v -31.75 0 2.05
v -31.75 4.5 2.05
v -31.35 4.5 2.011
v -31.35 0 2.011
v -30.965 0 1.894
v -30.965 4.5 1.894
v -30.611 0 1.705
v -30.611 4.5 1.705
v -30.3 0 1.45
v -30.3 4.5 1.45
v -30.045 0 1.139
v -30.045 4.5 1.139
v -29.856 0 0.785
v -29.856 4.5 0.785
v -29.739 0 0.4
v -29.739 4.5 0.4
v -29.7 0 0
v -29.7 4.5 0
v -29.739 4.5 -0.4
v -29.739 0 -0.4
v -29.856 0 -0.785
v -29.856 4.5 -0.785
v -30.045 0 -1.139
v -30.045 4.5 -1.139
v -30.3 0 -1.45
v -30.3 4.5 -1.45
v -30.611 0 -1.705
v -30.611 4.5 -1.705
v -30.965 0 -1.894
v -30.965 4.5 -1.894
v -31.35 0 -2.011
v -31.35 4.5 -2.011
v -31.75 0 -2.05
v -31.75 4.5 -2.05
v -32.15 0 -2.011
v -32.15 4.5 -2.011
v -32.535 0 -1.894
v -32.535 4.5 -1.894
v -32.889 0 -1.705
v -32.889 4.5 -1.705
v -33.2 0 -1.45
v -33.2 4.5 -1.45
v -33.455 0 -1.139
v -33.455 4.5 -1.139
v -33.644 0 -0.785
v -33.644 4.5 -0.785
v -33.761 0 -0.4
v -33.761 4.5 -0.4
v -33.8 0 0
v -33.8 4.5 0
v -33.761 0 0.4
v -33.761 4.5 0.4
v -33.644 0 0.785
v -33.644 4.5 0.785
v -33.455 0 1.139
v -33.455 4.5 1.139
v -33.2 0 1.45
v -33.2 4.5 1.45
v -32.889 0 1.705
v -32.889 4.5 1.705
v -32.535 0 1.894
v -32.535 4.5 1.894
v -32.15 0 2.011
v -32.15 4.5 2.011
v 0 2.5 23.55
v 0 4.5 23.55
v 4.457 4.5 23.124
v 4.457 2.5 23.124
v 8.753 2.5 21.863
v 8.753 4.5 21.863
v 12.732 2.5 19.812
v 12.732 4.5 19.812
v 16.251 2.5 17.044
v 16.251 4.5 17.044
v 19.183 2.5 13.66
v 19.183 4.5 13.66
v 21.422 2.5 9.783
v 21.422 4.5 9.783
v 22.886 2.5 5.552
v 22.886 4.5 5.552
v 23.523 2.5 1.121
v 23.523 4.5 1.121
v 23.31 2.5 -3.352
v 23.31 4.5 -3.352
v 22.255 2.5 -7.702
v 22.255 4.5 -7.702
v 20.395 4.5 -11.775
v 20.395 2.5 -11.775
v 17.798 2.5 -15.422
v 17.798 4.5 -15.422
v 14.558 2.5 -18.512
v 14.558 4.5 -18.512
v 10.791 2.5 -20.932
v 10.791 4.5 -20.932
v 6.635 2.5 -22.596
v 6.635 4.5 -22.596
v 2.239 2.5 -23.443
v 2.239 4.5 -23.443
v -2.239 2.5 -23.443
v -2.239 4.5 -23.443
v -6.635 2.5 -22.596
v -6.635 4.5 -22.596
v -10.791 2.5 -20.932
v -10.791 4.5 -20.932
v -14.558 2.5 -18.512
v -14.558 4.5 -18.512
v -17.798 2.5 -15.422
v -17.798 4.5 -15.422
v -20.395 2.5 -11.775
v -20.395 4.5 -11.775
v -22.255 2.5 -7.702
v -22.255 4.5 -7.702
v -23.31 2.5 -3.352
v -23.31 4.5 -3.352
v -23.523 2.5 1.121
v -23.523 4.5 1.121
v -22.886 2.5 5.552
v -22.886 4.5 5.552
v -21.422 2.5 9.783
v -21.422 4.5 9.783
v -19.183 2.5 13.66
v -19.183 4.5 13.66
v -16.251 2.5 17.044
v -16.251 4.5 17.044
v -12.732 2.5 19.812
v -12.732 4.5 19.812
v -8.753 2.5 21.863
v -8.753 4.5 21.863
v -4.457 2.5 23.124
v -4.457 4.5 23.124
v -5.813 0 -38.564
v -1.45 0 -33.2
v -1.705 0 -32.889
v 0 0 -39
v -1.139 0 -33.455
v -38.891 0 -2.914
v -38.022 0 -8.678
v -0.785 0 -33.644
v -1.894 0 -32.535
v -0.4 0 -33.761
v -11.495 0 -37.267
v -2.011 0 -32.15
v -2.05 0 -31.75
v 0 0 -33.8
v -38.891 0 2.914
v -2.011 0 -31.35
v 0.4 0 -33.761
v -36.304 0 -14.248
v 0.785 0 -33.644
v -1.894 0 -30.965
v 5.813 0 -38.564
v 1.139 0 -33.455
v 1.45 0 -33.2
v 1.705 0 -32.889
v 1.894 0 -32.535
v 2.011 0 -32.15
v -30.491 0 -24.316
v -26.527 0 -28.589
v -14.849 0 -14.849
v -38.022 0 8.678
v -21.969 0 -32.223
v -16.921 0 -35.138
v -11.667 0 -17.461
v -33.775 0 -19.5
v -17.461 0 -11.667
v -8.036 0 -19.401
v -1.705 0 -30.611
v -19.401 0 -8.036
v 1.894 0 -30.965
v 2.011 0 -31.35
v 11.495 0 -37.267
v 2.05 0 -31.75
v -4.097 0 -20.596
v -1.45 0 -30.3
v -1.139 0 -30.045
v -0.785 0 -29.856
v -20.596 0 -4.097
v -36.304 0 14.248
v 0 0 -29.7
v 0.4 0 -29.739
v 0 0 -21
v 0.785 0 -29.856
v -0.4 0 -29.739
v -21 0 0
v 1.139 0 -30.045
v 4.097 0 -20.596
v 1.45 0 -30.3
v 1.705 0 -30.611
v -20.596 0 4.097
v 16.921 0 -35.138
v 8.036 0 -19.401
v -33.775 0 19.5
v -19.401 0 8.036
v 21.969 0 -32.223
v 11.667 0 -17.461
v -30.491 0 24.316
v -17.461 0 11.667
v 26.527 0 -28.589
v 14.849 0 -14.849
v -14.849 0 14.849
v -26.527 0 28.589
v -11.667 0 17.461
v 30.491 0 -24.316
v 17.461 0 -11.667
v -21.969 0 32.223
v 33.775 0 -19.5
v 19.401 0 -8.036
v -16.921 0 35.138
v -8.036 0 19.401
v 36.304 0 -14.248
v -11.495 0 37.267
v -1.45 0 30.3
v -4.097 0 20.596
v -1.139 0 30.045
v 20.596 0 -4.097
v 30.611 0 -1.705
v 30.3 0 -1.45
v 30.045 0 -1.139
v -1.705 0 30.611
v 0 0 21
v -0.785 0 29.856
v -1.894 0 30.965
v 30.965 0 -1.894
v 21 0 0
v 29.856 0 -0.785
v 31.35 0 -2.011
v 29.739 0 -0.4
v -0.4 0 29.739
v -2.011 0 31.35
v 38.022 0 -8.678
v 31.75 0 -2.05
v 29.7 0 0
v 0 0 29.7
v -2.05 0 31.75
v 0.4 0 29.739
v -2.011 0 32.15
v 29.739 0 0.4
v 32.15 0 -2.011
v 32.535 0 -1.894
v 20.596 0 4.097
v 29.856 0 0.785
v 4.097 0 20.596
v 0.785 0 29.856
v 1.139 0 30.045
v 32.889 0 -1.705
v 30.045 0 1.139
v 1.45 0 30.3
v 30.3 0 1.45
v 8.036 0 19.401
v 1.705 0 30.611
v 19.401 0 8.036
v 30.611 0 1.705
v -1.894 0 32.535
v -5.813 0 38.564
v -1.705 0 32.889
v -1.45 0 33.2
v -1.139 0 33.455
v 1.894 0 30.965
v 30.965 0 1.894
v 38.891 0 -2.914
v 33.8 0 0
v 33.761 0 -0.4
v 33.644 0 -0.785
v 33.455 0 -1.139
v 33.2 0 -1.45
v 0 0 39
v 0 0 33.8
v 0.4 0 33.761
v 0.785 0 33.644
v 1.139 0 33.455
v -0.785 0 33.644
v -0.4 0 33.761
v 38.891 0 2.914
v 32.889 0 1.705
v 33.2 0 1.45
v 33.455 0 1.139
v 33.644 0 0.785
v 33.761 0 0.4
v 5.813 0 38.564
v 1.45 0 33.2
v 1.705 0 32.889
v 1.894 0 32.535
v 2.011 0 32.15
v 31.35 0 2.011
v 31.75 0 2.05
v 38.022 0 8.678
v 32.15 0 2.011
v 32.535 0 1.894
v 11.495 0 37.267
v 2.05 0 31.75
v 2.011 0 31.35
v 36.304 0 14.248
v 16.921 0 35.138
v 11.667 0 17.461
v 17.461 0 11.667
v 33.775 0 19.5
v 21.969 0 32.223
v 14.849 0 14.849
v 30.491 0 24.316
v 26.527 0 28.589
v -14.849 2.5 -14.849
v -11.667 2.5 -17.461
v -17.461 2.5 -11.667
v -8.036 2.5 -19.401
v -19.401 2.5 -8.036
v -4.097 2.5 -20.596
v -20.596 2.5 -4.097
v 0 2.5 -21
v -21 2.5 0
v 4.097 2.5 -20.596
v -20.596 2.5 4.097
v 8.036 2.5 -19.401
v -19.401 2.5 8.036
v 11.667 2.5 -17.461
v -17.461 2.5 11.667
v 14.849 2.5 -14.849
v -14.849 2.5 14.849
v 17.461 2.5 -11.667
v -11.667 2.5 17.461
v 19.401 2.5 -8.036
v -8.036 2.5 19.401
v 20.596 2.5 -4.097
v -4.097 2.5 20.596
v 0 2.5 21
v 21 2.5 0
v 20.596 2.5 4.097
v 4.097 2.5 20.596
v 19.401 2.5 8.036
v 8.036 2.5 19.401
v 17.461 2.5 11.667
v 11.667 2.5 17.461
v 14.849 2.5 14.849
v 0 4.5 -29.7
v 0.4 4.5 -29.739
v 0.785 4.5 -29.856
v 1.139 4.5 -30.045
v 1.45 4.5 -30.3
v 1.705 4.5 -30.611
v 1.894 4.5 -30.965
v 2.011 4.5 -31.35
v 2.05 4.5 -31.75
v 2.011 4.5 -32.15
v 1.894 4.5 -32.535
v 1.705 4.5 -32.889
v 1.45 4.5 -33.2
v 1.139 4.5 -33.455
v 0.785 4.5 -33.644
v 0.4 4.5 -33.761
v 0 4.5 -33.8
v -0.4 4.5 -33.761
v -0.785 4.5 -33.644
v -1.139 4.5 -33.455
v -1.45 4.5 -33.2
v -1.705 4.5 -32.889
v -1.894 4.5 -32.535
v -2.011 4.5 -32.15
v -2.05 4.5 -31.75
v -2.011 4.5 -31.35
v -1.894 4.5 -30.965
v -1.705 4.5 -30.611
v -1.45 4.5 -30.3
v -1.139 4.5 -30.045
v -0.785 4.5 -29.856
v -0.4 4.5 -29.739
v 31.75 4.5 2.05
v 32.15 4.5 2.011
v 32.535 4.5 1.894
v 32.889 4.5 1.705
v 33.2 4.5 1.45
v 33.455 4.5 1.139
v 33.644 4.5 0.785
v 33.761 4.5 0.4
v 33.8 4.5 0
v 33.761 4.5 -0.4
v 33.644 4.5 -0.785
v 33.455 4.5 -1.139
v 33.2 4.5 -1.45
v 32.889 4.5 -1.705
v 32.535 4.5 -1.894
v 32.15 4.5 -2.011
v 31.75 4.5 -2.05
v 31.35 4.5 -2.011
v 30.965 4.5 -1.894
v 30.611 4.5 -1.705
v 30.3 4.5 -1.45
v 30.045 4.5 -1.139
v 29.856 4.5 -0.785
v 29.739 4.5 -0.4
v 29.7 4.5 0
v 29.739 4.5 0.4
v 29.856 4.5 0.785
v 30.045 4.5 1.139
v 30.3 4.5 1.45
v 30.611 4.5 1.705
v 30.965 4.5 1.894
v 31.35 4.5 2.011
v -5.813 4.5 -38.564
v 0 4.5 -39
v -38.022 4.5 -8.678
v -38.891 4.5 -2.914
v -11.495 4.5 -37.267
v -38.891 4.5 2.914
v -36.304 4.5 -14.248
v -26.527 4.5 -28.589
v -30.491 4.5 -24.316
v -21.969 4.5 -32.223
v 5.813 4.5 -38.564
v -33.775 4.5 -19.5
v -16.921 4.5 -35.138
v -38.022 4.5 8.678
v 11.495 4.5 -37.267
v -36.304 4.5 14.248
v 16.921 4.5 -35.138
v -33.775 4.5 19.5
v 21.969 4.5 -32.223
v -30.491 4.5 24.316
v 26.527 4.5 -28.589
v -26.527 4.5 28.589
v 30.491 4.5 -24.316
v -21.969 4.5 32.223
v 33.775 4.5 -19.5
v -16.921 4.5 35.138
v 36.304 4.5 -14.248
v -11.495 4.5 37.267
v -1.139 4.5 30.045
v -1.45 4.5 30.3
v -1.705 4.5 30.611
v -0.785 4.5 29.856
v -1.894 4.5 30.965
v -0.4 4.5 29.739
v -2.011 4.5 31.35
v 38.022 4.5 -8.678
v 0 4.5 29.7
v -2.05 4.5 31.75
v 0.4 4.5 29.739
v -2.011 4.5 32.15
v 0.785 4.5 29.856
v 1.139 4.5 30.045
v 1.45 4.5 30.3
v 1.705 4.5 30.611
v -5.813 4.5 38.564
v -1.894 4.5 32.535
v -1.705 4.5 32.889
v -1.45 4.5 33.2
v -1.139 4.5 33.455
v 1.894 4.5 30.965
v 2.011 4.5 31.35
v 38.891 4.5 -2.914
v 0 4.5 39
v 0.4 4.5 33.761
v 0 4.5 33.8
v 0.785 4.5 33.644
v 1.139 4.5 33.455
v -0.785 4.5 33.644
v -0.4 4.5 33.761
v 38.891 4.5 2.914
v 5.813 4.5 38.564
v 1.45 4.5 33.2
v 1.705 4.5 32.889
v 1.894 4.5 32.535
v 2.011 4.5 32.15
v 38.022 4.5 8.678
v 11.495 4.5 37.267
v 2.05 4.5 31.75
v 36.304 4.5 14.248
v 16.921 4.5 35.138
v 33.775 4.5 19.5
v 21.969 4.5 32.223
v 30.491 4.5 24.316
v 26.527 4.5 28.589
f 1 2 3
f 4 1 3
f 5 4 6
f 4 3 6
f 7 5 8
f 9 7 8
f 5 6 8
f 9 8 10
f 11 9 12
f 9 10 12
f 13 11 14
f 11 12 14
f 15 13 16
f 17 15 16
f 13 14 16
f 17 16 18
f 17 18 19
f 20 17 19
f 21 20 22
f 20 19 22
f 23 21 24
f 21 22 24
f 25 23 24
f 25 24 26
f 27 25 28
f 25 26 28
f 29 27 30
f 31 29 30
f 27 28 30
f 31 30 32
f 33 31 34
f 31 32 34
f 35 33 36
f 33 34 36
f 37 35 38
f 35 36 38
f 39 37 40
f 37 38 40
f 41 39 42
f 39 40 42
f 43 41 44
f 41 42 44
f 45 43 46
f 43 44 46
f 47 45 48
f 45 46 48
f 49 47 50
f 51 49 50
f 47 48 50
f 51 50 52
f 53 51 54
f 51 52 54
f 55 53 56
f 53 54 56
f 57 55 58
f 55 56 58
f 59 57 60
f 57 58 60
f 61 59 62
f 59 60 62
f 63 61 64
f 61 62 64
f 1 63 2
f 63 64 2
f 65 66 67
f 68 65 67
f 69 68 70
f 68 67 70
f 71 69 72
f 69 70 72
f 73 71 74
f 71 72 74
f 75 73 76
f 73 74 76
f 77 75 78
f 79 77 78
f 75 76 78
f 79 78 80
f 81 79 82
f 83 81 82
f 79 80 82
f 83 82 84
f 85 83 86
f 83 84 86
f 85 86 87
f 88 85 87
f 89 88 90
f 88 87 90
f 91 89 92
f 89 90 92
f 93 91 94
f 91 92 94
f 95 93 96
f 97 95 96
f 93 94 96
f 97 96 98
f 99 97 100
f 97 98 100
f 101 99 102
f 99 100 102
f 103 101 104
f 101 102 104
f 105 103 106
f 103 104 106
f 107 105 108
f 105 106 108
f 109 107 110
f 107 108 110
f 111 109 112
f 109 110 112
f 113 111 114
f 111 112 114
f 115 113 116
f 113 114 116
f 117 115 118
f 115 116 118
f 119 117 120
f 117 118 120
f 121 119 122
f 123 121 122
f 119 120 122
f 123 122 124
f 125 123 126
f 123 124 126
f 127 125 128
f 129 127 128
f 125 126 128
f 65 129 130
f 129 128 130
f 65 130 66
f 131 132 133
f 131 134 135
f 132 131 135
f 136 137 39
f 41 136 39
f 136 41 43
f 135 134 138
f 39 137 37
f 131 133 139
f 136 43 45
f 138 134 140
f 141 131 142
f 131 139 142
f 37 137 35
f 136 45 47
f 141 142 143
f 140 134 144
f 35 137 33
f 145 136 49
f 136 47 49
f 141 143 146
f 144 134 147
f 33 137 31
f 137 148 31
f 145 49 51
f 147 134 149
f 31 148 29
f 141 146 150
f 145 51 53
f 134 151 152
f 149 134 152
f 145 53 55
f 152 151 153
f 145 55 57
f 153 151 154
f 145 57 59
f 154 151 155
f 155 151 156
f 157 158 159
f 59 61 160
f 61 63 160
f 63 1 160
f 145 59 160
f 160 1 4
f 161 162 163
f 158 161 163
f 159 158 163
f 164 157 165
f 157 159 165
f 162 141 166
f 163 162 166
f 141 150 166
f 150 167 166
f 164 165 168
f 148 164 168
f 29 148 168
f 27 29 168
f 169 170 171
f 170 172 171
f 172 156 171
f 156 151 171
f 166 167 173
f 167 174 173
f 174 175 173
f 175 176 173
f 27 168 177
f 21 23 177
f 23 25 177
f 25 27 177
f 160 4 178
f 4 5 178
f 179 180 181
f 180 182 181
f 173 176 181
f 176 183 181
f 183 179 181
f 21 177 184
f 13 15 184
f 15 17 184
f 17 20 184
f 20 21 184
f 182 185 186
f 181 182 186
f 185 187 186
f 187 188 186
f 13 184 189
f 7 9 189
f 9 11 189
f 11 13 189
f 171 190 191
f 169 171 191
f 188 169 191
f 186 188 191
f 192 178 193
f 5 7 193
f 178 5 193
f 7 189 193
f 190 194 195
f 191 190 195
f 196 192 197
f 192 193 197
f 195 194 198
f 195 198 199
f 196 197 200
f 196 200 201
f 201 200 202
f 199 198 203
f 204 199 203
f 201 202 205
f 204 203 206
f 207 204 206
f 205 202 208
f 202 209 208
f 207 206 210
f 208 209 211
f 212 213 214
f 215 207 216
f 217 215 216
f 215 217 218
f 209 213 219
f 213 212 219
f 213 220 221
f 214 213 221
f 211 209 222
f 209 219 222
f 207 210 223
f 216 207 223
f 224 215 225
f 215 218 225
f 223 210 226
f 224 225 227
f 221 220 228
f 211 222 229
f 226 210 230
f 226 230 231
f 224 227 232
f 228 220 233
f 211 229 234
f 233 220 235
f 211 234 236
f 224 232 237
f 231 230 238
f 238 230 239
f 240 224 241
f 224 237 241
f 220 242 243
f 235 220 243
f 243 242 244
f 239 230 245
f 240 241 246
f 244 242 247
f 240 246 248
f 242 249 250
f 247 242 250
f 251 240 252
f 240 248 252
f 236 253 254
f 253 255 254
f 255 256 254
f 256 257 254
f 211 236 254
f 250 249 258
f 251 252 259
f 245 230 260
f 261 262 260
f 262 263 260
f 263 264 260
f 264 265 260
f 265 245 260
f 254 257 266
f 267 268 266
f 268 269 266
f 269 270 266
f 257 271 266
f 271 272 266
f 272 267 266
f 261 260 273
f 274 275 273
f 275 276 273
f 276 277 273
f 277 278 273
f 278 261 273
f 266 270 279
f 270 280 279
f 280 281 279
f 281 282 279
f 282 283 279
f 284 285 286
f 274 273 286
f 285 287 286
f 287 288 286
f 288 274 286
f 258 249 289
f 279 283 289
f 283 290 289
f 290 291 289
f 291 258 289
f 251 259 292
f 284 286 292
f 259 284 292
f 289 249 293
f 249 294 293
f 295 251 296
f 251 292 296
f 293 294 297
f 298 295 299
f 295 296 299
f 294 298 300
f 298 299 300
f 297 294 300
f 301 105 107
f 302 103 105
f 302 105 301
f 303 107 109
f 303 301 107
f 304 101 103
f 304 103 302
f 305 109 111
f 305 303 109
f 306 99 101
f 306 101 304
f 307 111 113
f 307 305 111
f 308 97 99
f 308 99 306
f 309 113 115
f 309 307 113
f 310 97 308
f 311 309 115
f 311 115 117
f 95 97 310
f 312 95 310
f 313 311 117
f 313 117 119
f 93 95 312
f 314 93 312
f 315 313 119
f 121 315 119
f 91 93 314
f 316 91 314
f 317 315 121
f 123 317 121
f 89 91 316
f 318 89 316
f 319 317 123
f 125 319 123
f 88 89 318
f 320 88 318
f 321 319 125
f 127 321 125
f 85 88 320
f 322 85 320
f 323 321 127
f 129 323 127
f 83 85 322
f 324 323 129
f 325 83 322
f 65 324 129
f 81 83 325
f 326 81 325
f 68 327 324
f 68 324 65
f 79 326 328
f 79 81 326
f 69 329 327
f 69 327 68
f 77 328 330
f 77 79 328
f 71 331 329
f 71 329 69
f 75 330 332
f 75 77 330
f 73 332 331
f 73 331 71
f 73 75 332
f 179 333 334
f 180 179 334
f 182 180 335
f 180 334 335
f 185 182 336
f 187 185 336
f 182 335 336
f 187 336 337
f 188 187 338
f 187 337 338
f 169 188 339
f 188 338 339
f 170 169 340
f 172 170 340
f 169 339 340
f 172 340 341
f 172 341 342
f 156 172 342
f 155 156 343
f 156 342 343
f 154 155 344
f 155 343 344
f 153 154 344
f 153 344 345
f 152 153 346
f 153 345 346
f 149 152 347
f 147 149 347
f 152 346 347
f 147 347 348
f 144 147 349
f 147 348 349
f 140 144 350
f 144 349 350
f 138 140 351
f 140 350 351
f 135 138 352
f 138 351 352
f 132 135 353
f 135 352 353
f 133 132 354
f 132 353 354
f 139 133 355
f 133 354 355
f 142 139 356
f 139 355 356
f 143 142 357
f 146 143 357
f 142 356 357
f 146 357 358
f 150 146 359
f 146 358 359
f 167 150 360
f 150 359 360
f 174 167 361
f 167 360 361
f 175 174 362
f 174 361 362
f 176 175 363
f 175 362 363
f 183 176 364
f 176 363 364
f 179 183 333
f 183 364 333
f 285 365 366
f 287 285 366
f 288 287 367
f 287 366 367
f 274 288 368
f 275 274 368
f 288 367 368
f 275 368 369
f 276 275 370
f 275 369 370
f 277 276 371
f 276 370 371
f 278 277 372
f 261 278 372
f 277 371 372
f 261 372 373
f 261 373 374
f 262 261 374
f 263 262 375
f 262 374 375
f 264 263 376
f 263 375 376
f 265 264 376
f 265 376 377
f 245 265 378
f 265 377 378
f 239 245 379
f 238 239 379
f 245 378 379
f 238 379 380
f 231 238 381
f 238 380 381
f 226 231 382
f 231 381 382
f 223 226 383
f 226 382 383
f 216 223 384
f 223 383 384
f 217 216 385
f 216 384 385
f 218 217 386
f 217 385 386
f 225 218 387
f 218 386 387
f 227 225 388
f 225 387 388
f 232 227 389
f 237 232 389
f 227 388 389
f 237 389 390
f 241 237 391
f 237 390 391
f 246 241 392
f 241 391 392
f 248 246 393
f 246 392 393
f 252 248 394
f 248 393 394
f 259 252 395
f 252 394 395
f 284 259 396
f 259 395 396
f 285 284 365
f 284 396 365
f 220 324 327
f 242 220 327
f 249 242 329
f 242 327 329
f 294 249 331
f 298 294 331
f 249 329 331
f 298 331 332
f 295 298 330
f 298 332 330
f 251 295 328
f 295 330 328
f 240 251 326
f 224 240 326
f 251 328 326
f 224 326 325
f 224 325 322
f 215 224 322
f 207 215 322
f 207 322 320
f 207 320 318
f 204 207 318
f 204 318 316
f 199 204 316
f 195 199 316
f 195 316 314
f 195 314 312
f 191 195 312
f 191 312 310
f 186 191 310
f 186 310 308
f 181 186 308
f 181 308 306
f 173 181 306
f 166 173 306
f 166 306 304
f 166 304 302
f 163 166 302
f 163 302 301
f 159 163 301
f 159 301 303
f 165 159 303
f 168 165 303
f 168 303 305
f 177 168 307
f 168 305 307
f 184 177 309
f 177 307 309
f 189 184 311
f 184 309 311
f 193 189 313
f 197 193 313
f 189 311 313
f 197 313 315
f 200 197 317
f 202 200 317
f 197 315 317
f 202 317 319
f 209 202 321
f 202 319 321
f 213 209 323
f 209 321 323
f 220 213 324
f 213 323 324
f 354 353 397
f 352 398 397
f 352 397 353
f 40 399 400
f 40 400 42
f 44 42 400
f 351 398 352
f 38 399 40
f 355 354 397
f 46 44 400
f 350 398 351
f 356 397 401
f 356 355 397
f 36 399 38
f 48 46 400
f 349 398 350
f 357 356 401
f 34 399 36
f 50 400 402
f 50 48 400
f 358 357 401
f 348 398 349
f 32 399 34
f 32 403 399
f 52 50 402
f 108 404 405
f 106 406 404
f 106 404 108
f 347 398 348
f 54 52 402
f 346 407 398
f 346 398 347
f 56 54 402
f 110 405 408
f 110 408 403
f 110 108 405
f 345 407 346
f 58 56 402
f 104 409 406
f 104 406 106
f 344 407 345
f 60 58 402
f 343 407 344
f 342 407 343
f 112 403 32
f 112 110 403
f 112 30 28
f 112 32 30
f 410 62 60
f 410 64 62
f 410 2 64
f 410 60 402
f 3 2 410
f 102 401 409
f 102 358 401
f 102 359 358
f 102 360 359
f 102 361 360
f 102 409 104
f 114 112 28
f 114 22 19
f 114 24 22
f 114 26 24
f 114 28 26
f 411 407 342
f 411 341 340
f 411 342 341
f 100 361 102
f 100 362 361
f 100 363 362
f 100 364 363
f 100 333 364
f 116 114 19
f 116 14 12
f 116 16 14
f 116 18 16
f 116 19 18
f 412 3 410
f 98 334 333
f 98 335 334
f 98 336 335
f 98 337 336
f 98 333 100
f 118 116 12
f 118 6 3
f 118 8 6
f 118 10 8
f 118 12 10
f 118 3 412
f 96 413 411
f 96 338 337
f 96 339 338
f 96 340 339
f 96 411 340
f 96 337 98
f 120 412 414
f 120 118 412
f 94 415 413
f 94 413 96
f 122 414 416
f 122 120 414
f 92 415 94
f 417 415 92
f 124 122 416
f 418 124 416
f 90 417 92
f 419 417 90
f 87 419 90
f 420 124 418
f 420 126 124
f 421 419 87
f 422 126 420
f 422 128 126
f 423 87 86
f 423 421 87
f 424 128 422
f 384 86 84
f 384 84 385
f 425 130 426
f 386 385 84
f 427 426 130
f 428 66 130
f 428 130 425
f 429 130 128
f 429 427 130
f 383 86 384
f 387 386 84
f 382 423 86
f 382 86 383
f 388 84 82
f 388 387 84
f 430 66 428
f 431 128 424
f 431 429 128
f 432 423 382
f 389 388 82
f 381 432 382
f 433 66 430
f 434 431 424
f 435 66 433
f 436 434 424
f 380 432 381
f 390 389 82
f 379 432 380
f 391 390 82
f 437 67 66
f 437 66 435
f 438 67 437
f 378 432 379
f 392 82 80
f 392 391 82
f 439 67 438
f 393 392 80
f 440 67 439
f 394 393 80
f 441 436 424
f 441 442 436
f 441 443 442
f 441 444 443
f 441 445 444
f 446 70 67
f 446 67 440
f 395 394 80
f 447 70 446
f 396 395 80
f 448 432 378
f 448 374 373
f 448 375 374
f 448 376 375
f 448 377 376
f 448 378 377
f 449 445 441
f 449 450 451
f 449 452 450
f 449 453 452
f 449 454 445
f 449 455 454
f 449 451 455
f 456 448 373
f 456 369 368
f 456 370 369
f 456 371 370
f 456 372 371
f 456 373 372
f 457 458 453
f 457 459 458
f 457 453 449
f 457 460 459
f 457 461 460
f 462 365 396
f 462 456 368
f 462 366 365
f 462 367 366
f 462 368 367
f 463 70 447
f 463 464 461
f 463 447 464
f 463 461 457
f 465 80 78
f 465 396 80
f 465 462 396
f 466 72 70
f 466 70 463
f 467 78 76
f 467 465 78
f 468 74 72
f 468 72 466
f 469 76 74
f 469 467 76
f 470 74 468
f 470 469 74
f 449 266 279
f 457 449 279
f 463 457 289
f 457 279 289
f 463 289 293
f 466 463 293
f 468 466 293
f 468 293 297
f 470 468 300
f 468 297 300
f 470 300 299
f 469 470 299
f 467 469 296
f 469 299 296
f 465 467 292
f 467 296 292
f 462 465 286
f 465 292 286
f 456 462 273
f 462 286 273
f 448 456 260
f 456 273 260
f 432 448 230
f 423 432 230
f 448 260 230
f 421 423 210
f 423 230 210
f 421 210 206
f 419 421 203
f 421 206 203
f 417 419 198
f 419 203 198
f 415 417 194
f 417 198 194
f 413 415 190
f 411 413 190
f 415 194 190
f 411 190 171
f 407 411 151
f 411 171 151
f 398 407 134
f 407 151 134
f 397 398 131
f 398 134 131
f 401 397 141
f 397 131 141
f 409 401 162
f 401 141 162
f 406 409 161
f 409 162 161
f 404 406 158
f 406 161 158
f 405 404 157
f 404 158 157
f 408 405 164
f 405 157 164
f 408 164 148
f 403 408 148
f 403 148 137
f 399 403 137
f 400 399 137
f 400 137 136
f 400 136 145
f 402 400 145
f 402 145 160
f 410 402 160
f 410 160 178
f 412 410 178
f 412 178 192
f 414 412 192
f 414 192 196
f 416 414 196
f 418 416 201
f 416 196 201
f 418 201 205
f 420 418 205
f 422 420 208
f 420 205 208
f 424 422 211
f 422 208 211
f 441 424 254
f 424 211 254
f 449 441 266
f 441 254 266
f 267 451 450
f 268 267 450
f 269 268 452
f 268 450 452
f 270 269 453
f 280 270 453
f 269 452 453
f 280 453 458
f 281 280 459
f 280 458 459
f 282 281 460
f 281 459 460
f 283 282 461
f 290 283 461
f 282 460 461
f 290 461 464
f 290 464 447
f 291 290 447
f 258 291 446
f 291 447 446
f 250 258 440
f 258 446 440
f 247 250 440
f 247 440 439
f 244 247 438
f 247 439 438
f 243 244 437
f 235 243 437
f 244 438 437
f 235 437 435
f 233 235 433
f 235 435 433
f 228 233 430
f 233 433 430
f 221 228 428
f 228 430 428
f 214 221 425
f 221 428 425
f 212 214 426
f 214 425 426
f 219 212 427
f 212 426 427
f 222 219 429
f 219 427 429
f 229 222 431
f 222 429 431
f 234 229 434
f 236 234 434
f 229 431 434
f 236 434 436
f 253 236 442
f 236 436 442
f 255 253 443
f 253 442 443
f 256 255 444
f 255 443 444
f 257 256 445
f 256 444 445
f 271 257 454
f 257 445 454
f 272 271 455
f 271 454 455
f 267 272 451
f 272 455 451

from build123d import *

# Parameters (mm, degrees)
SKETCH1_R           = 39
BOSS_EXTRUDE1_DEPTH = 4.5
SKETCH2_R           = 2.05
CUT_EXTRUDE1_DEPTH  = 4.5
SKETCH3_R           = 21
CUT_EXTRUDE2_DEPTH  = 4.5
SKETCH4_R           = 23.55
CUT_EXTRUDE3_DEPTH  = 2


with BuildPart() as part:
    # Sketch1 → Boss-Extrude1 (new body)
    with BuildSketch(Plane(origin=(0, 0, 0), x_dir=(1, 0, 0), z_dir=(0, 1, 0))):
        with Locations(Location((0, 0, 0), (0, 0, 270))):
            Circle(SKETCH1_R)
    extrude(amount=BOSS_EXTRUDE1_DEPTH)

    # Sketch2 → Cut-Extrude1 (cut)
    with BuildSketch(Plane(origin=(0, 4.5, 0), x_dir=(1, 0, 0), z_dir=(0, 1, 0))):
        with Locations(Location((31.75, 0, 0), (0, 0, 270))):
            Circle(SKETCH2_R)
        with Locations(Location((0, -31.75, 0), (0, 0, 270))):
            Circle(SKETCH2_R)
        with Locations(Location((-31.75, 0, 0), (0, 0, 270))):
            Circle(SKETCH2_R)
        with Locations(Location((0, 31.75, 0), (0, 0, 270))):
            Circle(SKETCH2_R)
    extrude(amount=-CUT_EXTRUDE1_DEPTH, mode=Mode.SUBTRACT)

    # Sketch3 → Cut-Extrude2 (cut)
    with BuildSketch(Plane(origin=(0, 4.5, 0), x_dir=(1, 0, 0), z_dir=(0, 1, 0))):
        with Locations(Location((0, 0, 0), (0, 0, 270))):
            Circle(SKETCH3_R)
    extrude(amount=-CUT_EXTRUDE2_DEPTH, mode=Mode.SUBTRACT)

    # Sketch4 → Cut-Extrude3 (cut)
    with BuildSketch(Plane(origin=(0, 4.5, 0), x_dir=(1, 0, 0), z_dir=(0, 1, 0))):
        with Locations(Location((0, 0, 0), (0, 0, 270))):
            Circle(SKETCH4_R)
    extrude(amount=-CUT_EXTRUDE3_DEPTH, mode=Mode.SUBTRACT)


solid = part.part
